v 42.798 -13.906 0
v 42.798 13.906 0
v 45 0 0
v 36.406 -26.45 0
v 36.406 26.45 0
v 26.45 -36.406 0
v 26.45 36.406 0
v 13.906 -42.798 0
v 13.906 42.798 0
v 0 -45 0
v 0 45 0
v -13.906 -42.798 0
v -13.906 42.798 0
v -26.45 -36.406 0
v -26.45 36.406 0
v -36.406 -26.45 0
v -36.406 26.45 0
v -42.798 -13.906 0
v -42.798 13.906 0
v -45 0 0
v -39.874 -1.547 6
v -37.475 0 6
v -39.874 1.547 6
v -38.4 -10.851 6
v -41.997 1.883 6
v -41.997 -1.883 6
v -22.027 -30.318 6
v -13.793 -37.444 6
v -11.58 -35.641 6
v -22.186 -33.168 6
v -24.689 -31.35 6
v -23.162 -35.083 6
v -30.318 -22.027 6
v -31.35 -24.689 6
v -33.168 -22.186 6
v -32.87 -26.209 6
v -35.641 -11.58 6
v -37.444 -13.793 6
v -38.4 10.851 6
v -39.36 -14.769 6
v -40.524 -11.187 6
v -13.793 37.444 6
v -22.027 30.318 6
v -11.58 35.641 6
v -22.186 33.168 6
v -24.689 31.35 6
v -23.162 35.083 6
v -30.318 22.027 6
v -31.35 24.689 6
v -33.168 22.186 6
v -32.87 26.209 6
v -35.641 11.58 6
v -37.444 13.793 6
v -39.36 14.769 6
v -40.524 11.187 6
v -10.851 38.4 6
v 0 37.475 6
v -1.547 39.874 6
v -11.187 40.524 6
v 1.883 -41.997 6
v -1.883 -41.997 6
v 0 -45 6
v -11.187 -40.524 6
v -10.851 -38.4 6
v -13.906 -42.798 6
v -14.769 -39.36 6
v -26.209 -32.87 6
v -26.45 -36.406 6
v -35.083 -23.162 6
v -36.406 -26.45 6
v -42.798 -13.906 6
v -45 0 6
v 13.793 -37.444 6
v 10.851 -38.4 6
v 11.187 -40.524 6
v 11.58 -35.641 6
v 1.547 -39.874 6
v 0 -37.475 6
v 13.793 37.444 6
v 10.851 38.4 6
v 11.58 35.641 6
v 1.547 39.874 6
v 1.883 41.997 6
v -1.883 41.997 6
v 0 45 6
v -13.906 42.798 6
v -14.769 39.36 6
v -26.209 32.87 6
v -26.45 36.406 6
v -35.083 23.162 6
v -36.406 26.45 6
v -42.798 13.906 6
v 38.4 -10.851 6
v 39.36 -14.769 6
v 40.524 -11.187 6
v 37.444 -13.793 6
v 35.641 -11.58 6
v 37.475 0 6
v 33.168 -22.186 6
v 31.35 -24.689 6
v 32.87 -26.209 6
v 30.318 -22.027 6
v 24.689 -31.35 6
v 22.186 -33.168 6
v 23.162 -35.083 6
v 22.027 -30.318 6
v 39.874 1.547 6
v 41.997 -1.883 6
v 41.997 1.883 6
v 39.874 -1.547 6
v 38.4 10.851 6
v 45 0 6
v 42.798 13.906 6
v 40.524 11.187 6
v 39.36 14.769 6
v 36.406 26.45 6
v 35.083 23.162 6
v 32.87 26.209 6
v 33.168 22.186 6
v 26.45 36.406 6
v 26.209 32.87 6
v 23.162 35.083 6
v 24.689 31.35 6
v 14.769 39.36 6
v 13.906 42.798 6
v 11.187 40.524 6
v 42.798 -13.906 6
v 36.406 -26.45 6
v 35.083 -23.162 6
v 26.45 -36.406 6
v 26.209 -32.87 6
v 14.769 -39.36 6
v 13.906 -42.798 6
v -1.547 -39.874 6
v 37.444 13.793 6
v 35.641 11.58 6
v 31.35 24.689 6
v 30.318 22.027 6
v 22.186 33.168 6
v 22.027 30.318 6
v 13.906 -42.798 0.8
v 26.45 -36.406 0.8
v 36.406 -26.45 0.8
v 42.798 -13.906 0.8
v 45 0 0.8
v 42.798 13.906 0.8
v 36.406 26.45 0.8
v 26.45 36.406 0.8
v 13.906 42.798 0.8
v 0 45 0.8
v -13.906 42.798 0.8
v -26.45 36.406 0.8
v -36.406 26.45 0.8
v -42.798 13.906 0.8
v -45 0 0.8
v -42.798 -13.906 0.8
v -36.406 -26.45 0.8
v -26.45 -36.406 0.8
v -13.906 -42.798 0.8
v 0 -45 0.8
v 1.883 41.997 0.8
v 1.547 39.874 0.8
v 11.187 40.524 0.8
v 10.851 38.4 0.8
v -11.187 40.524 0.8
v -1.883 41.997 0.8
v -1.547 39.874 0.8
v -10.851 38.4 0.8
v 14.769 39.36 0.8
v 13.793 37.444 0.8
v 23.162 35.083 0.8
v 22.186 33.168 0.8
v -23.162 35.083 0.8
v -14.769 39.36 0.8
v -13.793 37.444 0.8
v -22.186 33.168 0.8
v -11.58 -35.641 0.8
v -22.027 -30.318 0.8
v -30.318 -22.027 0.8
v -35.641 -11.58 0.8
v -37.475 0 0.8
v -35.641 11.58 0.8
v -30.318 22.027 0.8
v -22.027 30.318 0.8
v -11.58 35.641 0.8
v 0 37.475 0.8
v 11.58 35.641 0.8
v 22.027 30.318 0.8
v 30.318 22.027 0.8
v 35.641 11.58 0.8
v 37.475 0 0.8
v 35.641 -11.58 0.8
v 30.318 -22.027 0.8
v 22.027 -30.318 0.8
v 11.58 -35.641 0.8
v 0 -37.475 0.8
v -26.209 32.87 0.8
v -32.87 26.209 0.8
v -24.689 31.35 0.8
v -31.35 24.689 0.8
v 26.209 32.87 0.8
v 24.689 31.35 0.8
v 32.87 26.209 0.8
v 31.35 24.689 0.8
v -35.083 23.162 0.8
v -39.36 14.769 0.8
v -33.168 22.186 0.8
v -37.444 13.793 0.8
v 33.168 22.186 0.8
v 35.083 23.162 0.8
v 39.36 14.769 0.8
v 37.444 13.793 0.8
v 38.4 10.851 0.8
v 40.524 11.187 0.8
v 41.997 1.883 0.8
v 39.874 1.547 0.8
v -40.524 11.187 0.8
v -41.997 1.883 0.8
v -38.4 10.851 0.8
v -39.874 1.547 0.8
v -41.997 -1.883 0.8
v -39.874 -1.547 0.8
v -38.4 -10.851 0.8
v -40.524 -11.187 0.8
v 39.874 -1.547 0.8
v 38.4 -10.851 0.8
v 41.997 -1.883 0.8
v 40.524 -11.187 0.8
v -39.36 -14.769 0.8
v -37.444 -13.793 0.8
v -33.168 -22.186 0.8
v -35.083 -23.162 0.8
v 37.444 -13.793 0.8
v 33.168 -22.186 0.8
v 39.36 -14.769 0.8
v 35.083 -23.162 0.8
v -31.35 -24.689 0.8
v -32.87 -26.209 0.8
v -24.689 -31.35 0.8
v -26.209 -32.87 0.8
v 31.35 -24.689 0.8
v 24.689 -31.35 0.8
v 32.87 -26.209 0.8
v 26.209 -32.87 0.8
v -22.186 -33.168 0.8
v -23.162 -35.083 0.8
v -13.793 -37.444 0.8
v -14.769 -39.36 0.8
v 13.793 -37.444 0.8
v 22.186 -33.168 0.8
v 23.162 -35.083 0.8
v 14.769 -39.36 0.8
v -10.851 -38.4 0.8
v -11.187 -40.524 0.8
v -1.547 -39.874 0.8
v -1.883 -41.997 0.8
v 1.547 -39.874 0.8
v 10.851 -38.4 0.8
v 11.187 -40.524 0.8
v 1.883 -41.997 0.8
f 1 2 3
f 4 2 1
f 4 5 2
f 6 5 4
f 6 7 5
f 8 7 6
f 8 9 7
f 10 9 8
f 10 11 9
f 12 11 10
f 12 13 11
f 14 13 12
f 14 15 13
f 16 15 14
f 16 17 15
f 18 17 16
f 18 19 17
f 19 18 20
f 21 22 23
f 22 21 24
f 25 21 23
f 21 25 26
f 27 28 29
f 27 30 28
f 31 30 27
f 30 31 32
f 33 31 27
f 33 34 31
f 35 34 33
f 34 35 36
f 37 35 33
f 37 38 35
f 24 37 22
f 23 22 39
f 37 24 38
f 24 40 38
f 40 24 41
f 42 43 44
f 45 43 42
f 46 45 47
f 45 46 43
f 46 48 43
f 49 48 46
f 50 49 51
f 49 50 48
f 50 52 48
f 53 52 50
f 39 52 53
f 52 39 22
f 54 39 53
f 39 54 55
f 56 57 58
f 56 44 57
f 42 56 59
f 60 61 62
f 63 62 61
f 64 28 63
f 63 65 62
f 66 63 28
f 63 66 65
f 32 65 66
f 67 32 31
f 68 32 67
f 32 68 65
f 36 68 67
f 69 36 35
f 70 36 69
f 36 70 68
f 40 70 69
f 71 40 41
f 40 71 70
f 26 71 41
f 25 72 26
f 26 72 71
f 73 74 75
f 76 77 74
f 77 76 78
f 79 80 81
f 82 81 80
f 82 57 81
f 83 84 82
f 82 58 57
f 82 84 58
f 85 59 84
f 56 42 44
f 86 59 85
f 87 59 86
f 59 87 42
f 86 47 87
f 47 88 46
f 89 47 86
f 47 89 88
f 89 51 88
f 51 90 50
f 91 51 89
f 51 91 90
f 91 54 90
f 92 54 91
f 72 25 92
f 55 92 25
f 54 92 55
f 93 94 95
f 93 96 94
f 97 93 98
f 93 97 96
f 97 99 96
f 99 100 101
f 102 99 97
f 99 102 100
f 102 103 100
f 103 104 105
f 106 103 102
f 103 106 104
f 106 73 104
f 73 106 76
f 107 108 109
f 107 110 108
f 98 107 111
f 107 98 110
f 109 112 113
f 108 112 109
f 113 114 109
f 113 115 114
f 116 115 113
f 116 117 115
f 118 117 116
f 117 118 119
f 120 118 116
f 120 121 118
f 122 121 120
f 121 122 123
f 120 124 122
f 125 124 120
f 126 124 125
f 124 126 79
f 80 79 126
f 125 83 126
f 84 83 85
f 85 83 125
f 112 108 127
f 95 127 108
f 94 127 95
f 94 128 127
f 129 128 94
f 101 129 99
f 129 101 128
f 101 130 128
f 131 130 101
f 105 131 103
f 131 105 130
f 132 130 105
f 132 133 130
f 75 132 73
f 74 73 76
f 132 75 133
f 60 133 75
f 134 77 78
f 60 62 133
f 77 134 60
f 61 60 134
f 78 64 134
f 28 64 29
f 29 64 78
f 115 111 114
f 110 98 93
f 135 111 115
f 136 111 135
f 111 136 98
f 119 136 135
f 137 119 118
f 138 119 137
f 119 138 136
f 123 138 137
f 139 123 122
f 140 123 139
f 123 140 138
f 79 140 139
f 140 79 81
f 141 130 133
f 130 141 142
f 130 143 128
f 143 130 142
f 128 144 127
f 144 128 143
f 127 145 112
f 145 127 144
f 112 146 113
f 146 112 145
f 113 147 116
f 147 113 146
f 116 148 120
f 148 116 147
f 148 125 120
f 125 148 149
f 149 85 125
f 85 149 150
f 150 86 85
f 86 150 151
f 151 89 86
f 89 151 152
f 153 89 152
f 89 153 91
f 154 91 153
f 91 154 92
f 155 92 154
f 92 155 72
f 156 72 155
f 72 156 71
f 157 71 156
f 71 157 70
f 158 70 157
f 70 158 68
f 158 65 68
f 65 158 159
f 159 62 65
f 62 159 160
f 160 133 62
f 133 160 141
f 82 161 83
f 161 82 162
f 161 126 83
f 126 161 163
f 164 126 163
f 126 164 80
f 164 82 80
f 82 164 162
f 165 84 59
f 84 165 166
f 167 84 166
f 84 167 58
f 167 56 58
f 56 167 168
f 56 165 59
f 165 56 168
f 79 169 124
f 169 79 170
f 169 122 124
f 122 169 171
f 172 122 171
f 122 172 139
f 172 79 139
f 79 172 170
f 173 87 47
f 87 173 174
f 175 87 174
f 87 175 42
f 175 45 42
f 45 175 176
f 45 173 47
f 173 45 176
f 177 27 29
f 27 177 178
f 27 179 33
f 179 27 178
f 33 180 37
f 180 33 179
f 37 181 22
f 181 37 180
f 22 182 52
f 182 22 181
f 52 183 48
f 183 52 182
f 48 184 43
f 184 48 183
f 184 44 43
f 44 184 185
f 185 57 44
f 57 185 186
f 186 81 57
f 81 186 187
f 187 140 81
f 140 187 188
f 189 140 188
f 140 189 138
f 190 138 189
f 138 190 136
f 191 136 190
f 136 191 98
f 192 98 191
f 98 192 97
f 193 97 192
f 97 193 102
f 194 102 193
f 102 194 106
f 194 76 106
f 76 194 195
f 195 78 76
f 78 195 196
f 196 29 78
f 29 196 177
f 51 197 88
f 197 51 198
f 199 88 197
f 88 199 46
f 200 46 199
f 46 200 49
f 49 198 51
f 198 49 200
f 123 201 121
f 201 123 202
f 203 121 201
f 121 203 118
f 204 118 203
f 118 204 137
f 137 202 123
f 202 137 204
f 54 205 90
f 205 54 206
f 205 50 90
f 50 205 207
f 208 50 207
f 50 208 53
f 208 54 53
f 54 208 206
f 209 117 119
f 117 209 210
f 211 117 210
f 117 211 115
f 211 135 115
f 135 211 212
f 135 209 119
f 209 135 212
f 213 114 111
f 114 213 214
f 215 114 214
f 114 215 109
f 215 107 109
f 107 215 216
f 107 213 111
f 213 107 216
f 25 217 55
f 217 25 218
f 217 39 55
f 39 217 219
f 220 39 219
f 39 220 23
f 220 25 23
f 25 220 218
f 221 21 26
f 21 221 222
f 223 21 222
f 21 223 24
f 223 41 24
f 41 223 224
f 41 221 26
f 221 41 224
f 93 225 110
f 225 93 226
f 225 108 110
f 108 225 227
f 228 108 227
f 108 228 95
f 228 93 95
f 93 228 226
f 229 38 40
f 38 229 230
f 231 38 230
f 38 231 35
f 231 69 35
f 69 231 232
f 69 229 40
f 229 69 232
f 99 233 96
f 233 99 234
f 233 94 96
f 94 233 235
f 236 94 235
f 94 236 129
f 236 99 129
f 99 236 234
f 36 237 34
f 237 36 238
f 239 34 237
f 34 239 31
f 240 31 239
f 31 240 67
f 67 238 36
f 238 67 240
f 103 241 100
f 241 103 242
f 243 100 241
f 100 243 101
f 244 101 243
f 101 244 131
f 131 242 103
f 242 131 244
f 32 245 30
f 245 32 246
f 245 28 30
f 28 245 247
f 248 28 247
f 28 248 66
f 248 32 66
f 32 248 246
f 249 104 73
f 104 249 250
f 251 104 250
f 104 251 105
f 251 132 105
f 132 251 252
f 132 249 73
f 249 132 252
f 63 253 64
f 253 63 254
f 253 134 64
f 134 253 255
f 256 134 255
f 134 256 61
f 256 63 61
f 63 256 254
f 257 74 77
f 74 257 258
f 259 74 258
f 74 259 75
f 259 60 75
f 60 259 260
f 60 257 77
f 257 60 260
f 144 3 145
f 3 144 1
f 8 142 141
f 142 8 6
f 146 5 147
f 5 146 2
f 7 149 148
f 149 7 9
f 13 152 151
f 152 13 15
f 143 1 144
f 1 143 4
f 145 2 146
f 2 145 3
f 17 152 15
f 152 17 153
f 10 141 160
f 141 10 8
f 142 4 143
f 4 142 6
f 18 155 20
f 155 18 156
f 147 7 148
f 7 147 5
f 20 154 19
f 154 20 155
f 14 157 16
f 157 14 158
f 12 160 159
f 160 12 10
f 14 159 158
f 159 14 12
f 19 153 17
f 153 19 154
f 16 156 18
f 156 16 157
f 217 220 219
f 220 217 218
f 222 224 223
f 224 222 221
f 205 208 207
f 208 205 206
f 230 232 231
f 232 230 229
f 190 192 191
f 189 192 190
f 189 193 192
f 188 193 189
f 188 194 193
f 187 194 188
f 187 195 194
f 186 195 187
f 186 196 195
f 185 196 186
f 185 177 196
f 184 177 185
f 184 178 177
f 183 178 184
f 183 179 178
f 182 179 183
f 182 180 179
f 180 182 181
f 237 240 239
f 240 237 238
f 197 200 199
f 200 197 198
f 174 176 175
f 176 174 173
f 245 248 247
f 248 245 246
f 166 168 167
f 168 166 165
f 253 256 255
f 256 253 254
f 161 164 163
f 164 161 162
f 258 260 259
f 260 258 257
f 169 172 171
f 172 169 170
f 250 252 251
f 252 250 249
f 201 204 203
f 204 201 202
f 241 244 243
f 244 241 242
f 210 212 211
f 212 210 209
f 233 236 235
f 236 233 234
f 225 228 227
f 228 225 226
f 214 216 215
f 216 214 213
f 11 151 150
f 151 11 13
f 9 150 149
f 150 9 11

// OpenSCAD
stick_thick=2.15; // mm
stick_width = 9.42; // mm
diameter = 90; // mm
thickness = 6;  // mm
stick_count = floor(diameter / (stick_width * 1.5) * PI); 
floor_thickness = 0.8; // mm

step = 360 / stick_count;
$fn = stick_count; 

linear_extrude(thickness) {
    difference() {
      circle(d=diameter);
      for (i = [step:step:365]) {
          rotate([0,0,i + step / 2]) {
              translate([diameter / 2 - 2 * stick_thick, 0]) {
                  square([stick_thick, stick_width], true);
              }
          }
      }
      circle(d=diameter - 7 * stick_thick);
    }
}

linear_extrude(floor_thickness) {
    circle(d=diameter);
}
